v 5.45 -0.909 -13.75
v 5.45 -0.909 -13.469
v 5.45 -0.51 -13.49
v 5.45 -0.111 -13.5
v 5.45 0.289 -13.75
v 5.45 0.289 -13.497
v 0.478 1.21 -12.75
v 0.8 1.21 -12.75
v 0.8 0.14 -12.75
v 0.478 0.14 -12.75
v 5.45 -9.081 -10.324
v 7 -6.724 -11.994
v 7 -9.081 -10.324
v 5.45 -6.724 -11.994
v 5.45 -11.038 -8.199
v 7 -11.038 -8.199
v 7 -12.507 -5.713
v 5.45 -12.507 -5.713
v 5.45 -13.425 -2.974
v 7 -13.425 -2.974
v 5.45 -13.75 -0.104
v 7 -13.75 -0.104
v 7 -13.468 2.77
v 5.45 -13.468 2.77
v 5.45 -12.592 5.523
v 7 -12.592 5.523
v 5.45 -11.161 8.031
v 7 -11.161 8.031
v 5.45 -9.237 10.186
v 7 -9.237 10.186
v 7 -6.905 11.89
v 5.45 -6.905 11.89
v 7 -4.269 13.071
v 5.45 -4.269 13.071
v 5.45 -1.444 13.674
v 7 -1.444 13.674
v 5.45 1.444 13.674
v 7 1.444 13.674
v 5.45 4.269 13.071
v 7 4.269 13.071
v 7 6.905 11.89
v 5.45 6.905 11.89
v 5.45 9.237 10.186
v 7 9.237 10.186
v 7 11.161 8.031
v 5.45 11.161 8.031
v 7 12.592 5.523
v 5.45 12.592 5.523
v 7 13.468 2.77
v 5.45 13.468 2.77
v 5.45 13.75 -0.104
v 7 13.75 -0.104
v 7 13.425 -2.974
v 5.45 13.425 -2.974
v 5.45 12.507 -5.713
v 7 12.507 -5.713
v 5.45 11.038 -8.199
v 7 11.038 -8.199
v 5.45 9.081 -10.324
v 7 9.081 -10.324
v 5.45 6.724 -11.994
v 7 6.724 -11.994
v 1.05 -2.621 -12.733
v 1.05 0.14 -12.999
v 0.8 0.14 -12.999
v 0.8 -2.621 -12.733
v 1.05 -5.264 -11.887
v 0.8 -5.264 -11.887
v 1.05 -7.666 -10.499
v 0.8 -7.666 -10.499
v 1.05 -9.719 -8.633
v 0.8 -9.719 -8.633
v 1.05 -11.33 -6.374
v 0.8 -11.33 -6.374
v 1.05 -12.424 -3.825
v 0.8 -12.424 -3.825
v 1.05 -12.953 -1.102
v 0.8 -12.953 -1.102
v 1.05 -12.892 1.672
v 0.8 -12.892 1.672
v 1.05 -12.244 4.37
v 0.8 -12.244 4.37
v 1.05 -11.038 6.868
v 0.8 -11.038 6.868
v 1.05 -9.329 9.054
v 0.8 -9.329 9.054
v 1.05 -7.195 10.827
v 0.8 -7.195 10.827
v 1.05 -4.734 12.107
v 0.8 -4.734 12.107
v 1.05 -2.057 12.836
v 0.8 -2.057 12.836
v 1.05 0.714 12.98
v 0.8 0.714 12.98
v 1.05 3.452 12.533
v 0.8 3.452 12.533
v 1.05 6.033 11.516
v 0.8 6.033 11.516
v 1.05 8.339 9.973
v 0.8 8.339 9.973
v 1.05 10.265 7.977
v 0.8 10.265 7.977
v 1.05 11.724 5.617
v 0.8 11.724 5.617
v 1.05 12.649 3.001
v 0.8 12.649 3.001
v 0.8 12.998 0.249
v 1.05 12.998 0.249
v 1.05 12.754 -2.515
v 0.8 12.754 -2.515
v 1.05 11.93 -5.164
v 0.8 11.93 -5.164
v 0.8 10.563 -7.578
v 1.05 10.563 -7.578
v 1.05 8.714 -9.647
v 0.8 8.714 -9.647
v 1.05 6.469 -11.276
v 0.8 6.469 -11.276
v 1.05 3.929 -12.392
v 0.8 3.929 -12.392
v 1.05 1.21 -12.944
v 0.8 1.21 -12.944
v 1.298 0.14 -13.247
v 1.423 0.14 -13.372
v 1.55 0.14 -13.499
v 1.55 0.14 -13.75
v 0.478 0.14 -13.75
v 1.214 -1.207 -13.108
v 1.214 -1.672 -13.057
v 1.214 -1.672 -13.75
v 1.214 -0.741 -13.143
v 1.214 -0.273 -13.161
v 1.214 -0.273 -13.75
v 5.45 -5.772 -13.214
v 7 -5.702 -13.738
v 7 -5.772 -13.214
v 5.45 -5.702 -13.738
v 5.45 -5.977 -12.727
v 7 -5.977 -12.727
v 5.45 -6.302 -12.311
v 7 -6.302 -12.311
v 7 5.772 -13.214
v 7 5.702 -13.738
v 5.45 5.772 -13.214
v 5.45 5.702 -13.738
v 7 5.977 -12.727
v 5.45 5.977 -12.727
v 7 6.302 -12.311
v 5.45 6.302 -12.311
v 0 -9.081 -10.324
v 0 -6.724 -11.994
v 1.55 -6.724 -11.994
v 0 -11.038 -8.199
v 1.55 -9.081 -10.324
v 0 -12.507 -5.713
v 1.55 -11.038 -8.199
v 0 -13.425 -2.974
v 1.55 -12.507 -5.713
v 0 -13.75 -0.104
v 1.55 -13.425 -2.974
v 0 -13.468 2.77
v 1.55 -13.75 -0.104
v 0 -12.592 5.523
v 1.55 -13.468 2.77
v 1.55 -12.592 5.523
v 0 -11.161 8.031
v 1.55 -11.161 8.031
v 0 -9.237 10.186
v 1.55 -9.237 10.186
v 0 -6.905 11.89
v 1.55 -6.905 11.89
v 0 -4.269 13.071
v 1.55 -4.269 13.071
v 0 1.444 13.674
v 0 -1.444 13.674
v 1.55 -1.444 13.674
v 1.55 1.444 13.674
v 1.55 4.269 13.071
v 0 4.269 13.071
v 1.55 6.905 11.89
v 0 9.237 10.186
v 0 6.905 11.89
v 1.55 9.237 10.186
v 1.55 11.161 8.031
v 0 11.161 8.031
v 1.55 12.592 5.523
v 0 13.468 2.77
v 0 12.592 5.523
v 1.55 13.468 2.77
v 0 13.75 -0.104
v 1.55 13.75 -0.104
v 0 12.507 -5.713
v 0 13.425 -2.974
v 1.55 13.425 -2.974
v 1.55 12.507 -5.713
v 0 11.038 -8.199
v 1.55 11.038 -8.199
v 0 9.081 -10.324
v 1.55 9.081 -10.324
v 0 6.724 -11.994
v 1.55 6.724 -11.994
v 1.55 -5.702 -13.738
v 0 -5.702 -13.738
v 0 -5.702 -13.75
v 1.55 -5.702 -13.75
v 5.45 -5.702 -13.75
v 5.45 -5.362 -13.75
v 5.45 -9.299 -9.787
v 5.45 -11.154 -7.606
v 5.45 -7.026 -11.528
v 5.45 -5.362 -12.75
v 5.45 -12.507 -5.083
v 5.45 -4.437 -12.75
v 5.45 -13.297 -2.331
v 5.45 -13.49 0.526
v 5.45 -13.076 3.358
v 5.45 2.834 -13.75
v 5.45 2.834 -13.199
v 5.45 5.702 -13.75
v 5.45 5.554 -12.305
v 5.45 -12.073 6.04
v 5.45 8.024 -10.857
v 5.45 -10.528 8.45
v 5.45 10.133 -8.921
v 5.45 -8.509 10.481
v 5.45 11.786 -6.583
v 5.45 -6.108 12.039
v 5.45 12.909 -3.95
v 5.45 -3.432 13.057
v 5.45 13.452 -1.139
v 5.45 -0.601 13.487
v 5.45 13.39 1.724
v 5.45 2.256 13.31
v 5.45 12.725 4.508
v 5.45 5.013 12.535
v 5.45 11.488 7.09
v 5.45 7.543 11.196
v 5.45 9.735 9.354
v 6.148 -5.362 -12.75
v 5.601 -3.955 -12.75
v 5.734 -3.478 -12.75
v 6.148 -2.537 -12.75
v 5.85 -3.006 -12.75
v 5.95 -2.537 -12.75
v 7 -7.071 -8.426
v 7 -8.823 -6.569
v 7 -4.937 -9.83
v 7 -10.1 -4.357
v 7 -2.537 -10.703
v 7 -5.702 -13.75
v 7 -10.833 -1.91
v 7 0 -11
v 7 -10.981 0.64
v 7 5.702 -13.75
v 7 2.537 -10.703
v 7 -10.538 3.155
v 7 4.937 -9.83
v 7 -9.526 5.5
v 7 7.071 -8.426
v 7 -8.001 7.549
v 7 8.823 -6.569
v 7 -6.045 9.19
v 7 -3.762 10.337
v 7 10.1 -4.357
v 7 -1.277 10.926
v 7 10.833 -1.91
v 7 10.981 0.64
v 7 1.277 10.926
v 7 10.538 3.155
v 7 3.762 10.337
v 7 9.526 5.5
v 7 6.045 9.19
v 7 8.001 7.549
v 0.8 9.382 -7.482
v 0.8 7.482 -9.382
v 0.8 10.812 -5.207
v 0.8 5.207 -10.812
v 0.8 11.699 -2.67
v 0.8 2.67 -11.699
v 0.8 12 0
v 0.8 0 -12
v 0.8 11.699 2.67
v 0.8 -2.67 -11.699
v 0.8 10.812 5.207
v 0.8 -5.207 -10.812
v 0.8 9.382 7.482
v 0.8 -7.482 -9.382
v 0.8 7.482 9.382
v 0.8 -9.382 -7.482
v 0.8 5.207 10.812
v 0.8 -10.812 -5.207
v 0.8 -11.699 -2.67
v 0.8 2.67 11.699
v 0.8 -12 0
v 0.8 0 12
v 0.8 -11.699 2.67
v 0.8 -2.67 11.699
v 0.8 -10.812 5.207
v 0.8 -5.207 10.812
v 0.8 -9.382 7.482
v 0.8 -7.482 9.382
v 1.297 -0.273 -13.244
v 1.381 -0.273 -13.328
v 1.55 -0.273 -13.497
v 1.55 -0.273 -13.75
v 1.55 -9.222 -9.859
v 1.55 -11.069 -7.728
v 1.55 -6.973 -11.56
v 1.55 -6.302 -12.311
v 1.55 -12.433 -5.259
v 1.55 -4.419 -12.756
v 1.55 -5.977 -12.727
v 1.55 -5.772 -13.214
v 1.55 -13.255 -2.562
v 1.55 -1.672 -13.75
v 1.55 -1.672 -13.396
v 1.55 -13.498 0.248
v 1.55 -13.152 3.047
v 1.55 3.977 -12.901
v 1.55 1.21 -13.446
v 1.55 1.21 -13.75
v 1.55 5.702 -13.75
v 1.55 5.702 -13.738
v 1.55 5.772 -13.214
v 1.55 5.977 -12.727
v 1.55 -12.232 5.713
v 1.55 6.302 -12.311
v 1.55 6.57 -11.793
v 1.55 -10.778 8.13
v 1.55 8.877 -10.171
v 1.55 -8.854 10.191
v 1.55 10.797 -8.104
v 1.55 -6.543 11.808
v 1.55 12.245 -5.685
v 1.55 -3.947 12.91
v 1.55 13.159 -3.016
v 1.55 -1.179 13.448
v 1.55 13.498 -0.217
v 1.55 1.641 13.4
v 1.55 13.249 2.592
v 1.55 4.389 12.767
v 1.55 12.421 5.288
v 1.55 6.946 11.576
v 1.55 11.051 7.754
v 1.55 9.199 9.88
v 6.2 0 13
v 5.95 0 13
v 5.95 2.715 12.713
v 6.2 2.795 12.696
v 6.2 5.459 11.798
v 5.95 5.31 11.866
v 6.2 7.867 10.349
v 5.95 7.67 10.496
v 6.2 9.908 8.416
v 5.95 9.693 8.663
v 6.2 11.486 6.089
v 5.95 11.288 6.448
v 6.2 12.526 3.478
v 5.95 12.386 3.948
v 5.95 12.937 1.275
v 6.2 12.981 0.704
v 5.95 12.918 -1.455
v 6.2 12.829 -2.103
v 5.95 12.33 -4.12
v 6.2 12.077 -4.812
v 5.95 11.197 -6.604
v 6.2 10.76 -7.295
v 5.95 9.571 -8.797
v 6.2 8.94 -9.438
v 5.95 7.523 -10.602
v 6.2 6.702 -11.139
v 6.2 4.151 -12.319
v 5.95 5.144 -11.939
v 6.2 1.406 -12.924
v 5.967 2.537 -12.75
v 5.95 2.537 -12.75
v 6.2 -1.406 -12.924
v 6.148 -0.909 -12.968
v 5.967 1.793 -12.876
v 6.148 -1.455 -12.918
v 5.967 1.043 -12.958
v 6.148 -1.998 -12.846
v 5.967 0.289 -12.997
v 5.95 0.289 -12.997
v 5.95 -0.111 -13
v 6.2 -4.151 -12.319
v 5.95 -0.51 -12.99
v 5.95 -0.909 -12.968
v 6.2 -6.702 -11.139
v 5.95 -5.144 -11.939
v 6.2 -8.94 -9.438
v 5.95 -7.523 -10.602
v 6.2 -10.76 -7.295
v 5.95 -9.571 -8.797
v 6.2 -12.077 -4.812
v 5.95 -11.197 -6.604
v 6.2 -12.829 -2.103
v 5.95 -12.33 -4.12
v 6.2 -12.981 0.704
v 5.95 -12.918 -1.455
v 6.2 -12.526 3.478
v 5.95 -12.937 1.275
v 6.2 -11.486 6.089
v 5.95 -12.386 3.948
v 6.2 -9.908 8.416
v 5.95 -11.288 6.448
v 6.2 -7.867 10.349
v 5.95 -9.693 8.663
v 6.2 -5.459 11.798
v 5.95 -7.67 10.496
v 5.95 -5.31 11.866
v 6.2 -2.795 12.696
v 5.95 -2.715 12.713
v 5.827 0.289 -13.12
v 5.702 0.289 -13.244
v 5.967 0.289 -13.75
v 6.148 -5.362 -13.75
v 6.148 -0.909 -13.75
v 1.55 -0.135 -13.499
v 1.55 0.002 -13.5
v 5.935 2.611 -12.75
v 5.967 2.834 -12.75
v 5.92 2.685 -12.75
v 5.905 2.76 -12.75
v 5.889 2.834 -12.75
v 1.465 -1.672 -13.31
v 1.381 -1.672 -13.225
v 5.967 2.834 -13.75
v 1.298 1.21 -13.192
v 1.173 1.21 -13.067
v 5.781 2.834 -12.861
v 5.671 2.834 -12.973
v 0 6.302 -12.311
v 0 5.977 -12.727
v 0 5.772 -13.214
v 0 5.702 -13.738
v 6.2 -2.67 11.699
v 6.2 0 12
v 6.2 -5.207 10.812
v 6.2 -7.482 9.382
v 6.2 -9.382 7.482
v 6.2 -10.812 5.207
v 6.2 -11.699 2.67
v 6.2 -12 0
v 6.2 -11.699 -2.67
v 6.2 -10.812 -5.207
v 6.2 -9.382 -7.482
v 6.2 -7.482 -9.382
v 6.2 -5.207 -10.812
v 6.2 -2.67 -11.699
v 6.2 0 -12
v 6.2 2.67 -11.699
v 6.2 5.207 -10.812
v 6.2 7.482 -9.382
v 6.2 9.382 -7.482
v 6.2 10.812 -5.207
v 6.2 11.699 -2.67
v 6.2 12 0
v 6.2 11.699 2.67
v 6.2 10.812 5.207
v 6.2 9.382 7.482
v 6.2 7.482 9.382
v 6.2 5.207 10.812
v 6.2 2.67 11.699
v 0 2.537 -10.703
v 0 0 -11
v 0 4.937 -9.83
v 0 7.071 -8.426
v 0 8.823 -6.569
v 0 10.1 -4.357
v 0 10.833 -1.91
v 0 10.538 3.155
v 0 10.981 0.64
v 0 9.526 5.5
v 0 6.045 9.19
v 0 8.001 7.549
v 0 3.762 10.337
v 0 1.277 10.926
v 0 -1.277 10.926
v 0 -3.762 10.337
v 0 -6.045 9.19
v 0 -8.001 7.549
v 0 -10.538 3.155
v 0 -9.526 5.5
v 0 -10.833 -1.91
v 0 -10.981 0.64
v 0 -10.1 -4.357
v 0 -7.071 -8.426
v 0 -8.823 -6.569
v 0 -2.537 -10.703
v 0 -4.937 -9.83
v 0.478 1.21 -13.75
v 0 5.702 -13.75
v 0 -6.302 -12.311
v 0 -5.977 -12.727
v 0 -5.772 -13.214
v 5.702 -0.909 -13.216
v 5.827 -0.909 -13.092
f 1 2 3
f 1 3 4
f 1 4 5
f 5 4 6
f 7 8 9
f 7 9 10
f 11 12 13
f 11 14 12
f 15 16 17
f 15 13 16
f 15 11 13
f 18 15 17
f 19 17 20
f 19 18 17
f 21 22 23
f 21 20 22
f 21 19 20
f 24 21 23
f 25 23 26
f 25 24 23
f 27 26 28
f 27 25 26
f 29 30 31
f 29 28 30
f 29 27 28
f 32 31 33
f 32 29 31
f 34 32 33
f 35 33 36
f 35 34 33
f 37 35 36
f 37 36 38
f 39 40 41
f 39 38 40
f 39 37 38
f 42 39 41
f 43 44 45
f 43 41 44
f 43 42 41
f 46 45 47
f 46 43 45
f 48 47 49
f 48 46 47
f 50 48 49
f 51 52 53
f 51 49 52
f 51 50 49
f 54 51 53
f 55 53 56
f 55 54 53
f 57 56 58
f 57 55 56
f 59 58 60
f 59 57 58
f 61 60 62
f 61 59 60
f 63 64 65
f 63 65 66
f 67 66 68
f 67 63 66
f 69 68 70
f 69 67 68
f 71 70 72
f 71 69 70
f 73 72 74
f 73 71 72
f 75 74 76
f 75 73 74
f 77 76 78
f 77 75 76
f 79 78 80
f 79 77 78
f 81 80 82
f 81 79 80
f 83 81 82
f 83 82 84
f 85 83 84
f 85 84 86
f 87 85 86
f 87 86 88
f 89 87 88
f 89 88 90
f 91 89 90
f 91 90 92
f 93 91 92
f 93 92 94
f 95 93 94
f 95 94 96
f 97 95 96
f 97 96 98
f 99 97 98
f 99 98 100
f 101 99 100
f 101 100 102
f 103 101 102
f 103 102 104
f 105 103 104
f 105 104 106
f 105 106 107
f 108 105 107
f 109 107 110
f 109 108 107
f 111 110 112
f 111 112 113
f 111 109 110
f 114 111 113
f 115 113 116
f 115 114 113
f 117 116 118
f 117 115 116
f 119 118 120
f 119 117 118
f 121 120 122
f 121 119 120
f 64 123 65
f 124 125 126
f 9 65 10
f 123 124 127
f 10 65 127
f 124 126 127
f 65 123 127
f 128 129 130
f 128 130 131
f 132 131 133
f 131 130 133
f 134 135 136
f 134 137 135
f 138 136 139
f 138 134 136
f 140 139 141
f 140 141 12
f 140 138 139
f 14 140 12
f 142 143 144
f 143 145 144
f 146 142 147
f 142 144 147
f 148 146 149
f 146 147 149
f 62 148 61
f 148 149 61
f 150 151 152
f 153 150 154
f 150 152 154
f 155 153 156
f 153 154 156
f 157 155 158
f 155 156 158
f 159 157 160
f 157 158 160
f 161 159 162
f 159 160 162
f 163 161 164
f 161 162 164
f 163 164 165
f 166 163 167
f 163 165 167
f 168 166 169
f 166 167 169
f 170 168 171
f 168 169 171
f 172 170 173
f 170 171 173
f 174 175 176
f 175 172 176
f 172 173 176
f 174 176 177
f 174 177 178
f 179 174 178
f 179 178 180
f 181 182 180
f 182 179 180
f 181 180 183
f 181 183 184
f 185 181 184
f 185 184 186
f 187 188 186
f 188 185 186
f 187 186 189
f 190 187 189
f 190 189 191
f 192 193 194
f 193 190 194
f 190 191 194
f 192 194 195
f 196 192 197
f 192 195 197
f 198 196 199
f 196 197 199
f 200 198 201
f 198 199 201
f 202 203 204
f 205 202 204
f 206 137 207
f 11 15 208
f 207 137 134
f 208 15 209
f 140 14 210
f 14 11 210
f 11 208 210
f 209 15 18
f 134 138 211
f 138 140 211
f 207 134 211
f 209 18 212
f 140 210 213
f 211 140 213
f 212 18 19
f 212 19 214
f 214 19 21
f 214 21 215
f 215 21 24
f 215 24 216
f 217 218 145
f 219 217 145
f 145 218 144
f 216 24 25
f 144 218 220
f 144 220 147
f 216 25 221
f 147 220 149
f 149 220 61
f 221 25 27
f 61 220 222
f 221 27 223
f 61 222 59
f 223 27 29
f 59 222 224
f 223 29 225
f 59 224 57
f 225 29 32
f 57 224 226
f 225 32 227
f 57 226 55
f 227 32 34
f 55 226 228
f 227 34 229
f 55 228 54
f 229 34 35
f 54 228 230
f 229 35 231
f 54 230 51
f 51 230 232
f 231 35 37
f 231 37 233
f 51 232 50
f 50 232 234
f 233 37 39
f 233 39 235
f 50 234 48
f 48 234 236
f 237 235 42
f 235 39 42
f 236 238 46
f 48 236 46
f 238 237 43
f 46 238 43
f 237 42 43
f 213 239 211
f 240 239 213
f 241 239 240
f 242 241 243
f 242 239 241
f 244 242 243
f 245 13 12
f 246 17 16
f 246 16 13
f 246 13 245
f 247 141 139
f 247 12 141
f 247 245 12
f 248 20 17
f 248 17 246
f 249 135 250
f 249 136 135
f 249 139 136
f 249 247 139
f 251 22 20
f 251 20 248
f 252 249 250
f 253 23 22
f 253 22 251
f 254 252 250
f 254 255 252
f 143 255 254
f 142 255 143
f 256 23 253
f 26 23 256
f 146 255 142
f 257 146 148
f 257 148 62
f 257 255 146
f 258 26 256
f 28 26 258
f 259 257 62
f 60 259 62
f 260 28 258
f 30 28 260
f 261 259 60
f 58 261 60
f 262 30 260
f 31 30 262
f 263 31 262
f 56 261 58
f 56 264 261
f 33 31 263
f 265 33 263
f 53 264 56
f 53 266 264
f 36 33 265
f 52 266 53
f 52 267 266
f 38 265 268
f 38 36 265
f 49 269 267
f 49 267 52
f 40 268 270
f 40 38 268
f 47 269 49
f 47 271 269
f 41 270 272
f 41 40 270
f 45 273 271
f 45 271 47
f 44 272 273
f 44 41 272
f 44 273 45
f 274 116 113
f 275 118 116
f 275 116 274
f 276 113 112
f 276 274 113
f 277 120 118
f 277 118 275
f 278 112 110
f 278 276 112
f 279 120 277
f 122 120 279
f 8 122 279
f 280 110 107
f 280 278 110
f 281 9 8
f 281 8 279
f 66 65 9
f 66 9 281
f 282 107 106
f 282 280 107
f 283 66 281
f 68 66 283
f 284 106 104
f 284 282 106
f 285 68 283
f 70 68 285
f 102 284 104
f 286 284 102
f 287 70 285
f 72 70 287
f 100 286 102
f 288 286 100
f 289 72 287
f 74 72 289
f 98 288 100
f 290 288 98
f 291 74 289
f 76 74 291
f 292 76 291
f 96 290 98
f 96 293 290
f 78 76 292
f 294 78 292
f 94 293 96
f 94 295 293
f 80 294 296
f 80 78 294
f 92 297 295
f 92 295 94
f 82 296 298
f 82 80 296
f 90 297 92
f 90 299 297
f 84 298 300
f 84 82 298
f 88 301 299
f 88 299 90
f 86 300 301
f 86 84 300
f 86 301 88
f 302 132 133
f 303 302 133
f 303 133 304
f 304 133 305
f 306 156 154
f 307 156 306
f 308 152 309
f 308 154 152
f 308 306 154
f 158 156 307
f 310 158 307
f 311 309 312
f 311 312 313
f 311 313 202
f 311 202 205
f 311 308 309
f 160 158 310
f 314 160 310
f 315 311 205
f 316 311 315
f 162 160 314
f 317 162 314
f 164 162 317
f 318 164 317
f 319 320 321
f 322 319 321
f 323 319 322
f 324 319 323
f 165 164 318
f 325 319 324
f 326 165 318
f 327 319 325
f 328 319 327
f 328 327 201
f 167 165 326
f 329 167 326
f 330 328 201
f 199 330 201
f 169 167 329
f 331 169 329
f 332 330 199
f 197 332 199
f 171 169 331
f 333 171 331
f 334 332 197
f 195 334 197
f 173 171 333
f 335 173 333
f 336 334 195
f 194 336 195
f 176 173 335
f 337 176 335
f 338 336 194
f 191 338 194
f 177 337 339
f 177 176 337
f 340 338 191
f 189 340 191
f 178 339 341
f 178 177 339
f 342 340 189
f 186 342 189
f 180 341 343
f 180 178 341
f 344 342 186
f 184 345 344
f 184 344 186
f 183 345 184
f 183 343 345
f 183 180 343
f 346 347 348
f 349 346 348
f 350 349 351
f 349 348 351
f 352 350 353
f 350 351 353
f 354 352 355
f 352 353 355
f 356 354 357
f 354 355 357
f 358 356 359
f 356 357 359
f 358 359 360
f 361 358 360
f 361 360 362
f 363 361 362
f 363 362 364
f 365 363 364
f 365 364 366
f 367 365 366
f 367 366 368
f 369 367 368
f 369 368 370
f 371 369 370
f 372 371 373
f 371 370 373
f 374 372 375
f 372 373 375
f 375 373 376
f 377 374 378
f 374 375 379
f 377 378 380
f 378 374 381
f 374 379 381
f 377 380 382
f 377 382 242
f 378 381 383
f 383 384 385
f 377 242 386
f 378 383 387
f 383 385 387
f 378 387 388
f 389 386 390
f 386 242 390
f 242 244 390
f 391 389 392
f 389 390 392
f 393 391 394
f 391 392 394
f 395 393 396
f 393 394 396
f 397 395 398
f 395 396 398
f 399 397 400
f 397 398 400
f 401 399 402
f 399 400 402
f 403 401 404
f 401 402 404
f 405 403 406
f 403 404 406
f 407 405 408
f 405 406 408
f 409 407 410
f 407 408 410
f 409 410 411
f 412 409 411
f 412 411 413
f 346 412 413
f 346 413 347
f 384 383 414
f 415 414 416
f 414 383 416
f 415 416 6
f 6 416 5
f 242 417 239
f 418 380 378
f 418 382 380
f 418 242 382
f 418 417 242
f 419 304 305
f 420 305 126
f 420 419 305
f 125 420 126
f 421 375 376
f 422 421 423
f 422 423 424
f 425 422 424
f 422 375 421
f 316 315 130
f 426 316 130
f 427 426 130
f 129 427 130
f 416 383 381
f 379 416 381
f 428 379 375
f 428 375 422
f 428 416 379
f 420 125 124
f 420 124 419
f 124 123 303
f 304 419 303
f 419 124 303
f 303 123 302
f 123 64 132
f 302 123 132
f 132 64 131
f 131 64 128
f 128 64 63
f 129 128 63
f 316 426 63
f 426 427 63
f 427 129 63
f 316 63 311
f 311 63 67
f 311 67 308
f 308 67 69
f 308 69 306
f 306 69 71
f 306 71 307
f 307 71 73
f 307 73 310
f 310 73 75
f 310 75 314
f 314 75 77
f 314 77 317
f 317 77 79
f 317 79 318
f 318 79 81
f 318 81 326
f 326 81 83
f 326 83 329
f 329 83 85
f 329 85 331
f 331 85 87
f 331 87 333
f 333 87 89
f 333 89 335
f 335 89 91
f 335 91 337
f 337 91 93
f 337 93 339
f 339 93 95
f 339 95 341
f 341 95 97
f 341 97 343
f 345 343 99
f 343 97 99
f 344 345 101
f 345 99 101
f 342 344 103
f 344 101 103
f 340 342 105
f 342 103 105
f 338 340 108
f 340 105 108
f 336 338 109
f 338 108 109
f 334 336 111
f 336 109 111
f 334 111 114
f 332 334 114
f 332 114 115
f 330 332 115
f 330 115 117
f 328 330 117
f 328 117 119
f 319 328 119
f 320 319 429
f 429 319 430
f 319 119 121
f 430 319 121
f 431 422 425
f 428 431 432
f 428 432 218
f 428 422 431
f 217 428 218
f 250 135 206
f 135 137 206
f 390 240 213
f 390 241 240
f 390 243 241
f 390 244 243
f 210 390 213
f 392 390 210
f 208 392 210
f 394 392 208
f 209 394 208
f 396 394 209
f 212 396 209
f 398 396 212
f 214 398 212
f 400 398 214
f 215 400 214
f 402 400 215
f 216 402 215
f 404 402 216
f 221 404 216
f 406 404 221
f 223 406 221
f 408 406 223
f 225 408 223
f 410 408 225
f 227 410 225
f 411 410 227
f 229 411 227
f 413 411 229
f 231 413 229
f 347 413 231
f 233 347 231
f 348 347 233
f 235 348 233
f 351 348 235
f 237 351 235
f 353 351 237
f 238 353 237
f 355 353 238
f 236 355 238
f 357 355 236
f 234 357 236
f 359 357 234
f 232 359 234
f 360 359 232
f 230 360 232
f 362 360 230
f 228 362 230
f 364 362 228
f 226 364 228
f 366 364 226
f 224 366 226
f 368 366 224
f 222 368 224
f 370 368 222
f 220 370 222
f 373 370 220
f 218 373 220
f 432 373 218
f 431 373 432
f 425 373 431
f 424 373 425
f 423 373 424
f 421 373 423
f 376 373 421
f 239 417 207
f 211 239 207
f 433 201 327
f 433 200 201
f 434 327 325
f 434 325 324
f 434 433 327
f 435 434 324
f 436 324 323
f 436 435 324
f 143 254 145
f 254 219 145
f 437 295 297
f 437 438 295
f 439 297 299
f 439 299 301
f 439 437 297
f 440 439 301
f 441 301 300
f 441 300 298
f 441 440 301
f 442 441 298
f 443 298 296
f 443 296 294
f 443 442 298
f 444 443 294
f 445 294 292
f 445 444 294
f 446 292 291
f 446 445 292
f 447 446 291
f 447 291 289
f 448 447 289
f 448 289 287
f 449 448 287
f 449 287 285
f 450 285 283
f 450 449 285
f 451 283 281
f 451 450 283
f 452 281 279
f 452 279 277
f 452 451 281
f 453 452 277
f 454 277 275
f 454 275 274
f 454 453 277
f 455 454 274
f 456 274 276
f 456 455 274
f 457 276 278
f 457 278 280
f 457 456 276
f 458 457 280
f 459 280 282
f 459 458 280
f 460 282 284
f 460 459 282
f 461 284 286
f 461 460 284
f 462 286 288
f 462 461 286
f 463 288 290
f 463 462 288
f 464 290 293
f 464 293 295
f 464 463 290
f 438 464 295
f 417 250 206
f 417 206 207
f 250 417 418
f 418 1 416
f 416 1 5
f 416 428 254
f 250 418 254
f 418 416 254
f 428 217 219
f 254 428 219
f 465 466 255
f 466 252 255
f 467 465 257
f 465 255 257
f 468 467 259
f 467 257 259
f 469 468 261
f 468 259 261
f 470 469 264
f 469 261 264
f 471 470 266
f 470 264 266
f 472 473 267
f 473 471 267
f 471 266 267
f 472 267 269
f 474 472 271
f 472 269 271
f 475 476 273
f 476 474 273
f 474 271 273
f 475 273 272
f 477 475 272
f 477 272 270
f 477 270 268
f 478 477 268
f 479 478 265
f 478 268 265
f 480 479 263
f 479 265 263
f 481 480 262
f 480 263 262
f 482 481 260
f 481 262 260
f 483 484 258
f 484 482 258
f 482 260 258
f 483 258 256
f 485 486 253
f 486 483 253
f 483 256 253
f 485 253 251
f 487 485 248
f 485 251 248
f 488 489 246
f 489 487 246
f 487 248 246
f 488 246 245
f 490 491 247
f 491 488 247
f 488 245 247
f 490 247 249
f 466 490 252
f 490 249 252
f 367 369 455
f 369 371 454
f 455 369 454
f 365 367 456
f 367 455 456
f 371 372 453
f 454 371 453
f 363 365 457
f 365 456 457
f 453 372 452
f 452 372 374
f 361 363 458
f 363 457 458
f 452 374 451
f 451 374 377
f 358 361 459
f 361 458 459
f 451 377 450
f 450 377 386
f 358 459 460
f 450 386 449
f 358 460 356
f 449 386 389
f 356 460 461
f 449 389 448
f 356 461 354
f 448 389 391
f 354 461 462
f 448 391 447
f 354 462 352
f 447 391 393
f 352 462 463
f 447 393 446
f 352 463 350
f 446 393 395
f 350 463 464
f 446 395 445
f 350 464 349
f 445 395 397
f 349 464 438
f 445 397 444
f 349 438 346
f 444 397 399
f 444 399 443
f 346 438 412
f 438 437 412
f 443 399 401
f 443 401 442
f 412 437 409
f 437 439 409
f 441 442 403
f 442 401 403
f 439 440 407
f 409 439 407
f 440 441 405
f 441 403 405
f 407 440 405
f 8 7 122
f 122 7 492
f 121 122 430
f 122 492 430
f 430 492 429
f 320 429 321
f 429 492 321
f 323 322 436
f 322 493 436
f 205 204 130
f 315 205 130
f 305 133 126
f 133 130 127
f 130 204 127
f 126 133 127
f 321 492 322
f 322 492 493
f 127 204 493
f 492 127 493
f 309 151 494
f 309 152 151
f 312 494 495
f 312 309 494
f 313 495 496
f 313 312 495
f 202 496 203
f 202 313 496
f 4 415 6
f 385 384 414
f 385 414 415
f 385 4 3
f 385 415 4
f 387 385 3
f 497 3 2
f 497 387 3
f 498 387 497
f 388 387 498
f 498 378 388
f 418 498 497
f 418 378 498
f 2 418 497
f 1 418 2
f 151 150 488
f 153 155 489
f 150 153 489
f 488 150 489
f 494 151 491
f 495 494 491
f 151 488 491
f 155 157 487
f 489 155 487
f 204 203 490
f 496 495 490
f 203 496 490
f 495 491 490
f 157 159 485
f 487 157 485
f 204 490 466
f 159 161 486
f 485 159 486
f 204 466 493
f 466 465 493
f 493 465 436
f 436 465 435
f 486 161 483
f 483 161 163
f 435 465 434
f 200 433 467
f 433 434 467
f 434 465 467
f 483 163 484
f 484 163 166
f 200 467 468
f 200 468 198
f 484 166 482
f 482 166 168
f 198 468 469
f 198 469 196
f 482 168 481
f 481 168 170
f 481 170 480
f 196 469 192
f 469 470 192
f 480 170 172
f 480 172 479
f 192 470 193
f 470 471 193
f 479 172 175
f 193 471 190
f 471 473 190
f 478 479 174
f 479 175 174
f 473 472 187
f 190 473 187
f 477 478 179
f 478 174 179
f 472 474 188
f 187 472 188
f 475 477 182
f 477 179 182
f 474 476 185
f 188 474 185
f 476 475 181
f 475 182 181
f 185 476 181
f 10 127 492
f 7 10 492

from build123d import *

# Parameters (mm, degrees)
SKETCH6_R                = 13.75
SKETCH6_R_2              = 11
BOSS_EXTRUDE2_DEPTH      = 7
SKETCH4_W                = 5.4
SKETCH4_H                = 1.75
BOSS_EXTRUDE3_REACH      = 30.322
SKETCH9_W                = 7
SKETCH9_H                = 9.16515139
BOSS_EXTRUDE4_START      = 0.75
SKETCH10_R               = 13.75
SKETCH10_R_2             = 13
BOSS_EXTRUDE4_DEPTH      = 0.75
CHAMFER1_SIZE            = 0.5
CHAMFER1_OF_MIRROR1_SIZE = 0.5
BOSS_EXTRUDE5_DEPTH      = 1.55
BOSS_EXTRUDE5_START      = 5.45
BOSS_EXTRUDE5_2_DEPTH    = 1.55
FILLET1_R                = 2
SKETCH12_W               = 1.554666846
SKETCH12_H               = 4.45309529
SKETCH12_W_2             = 1.373791393
SKETCH12_H_2             = 2.545281327
SKETCH12_W_3             = 0.712647602
SKETCH12_H_3             = 1.069707629
SKETCH12_W_4             = 1.072015963
SKETCH12_W_5             = 0.597408117
SKETCH12_H_4             = 1.399070537
SKETCH12_W_6             = 0.336309622
CUT_EXTRUDE1_DEPTH       = 1
SKETCH14_R               = 11
CUT_EXTRUDE2_DEPTH       = 21.667002685


# Read off the part's stored shape, not the designer's step: Boss-Extrude5
with BuildPart() as part:
    # Sketch6 → Boss-Extrude2 (new body)
    with BuildSketch(Plane(origin=(0, 0, 0), x_dir=(0, 0, -1), z_dir=(1, 0, 0))):
        Circle(SKETCH6_R)
        Circle(SKETCH6_R_2, mode=Mode.SUBTRACT)
    extrude(amount=BOSS_EXTRUDE2_DEPTH)

    # Sketch4 → Cut-Revolve1 (revolve, cut)
    with BuildSketch(Plane.XY, mode=Mode.PRIVATE) as cut_revolve1_sk:
        with Locations((3.5, -12.875)):
            Rectangle(SKETCH4_W, SKETCH4_H)
    revolve(cut_revolve1_sk.sketch.rotate(Axis((-11.602577702, 0, 0), (1, 0, 0)), 270), axis=Axis((-11.602577702, 0, 0), (1, 0, 0)), mode=Mode.SUBTRACT)

    # Sketch9 → Boss-Extrude3 (add, up to next)
    with BuildSketch(Plane.XY.offset(-10), mode=Mode.PRIVATE) as boss_extrude3_sk1:
        with Locations((3.5, 0)):
            Rectangle(SKETCH9_W, SKETCH9_H)
    boss_extrude3_tool1 = extrude(boss_extrude3_sk1.sketch, amount=-BOSS_EXTRUDE3_REACH, mode=Mode.PRIVATE) - part.part
    add(boss_extrude3_tool1.solids().sort_by_distance((3.5, 0, -10))[0])

    # Sketch10 → Boss-Extrude4 (add)
    with BuildSketch(Plane.ZY.offset(-6.2).offset(BOSS_EXTRUDE4_START)):
        Circle(SKETCH10_R)
        Circle(SKETCH10_R_2, mode=Mode.SUBTRACT)
    boss_extrude4 = extrude(amount=-BOSS_EXTRUDE4_DEPTH)

    # Chamfer1
    chamfer1_edges = [part.edges().sort_by_distance(p)[0] for p in [
        (5.45, 0, -13),
    ]]
    chamfer(chamfer1_edges, length=CHAMFER1_SIZE)

    # Mirror1: Boss-Extrude4 across plane
    add(boss_extrude4.mirror(Plane.ZY.offset(-3.5)))

    # Chamfer1 of Mirror1
    chamfer1_of_mirror1_edges = [part.edges().sort_by_distance(p)[0] for p in [
        (1.55, 0, -13),
    ]]
    chamfer(chamfer1_of_mirror1_edges, length=CHAMFER1_OF_MIRROR1_SIZE)

    # Boss-Extrude5 outline → Boss-Extrude5 (add)
    with BuildSketch(Plane.YZ):
        with BuildLine():
            ThreePointArc((0, -13.75), (-2.917586852, -13.436896478), (-5.7023, -12.511845376))
            Line((-5.7023, -12.511845376), (-5.7023, -13.75))
            Line((-5.7023, -13.75), (0, -13.75))
        make_face()
        with BuildLine():
            ThreePointArc((5.7023, -12.511845376), (2.917586852, -13.436896478), (0, -13.75))
            Line((0, -13.75), (5.7023, -13.75))
            Line((5.7023, -13.75), (5.7023, -12.511845376))
        make_face()
    extrude(amount=BOSS_EXTRUDE5_DEPTH)

    # Boss-Extrude5 2 outline → Boss-Extrude5 2 (add)
    with BuildSketch(Plane.YZ.offset(BOSS_EXTRUDE5_START)):
        with BuildLine():
            ThreePointArc((0, -13.75), (-2.917586852, -13.436896478), (-5.7023, -12.511845376))
            Line((-5.7023, -12.511845376), (-5.7023, -13.75))
            Line((-5.7023, -13.75), (0, -13.75))
        make_face()
        with BuildLine():
            ThreePointArc((5.7023, -12.511845376), (2.917586852, -13.436896478), (0, -13.75))
            Line((0, -13.75), (5.7023, -13.75))
            Line((5.7023, -13.75), (5.7023, -12.511845376))
        make_face()
    extrude(amount=BOSS_EXTRUDE5_2_DEPTH)

    # Fillet1
    fillet1_edges = [part.edges().sort_by_distance(p)[0] for p in [
        (6.225, -5.7023, -12.511845376),
        (6.225, 5.7023, -12.511845376),
        (0.775, -5.7023, -12.511845376),
        (0.775, 5.7023, -12.511845376),
    ]]
    fillet(fillet1_edges, radius=FILLET1_R)

    # Sketch12 → Cut-Extrude1 (cut)
    with BuildSketch(Plane(origin=(0, 0, -13.75), x_dir=(-1, 0, 0), z_dir=(0, 0, -1))):
        with Locations((-5.370167958, -3.135823217)):
            Rectangle(SKETCH12_W, SKETCH12_H)
        Polygon((-4.592834535, -0.909275572), (-4.592834535, -1.672246677), (-3.997102403, -1.672246677), (-3.997102403, -0.27317614), (-5.19036655, -0.27317614), (-5.19036655, -0.909275572), align=None)
        with Locations((-5.279730232, 1.561396449)):
            Rectangle(SKETCH12_W_2, SKETCH12_H_2)
        with Locations((-1.906323801, 0.675050165)):
            Rectangle(SKETCH12_W_3, SKETCH12_H_3)
        with Locations((-1.013992018, 0.675050165)):
            Rectangle(SKETCH12_W_4, SKETCH12_H_3)
        with Locations((-1.848704059, -0.972711409)):
            Rectangle(SKETCH12_W_5, SKETCH12_H_4)
        with Locations((-1.381845189, -0.972711409)):
            Rectangle(SKETCH12_W_6, SKETCH12_H_4)
    extrude(amount=-CUT_EXTRUDE1_DEPTH, mode=Mode.SUBTRACT)

    # Sketch14 → Cut-Extrude2 (cut, through all)
    with BuildSketch(Plane(origin=(7, 0, 0), x_dir=(0, 0, -1), z_dir=(1, 0, 0))):
        Circle(SKETCH14_R)
    extrude(amount=-CUT_EXTRUDE2_DEPTH, mode=Mode.SUBTRACT)


solid = part.part
